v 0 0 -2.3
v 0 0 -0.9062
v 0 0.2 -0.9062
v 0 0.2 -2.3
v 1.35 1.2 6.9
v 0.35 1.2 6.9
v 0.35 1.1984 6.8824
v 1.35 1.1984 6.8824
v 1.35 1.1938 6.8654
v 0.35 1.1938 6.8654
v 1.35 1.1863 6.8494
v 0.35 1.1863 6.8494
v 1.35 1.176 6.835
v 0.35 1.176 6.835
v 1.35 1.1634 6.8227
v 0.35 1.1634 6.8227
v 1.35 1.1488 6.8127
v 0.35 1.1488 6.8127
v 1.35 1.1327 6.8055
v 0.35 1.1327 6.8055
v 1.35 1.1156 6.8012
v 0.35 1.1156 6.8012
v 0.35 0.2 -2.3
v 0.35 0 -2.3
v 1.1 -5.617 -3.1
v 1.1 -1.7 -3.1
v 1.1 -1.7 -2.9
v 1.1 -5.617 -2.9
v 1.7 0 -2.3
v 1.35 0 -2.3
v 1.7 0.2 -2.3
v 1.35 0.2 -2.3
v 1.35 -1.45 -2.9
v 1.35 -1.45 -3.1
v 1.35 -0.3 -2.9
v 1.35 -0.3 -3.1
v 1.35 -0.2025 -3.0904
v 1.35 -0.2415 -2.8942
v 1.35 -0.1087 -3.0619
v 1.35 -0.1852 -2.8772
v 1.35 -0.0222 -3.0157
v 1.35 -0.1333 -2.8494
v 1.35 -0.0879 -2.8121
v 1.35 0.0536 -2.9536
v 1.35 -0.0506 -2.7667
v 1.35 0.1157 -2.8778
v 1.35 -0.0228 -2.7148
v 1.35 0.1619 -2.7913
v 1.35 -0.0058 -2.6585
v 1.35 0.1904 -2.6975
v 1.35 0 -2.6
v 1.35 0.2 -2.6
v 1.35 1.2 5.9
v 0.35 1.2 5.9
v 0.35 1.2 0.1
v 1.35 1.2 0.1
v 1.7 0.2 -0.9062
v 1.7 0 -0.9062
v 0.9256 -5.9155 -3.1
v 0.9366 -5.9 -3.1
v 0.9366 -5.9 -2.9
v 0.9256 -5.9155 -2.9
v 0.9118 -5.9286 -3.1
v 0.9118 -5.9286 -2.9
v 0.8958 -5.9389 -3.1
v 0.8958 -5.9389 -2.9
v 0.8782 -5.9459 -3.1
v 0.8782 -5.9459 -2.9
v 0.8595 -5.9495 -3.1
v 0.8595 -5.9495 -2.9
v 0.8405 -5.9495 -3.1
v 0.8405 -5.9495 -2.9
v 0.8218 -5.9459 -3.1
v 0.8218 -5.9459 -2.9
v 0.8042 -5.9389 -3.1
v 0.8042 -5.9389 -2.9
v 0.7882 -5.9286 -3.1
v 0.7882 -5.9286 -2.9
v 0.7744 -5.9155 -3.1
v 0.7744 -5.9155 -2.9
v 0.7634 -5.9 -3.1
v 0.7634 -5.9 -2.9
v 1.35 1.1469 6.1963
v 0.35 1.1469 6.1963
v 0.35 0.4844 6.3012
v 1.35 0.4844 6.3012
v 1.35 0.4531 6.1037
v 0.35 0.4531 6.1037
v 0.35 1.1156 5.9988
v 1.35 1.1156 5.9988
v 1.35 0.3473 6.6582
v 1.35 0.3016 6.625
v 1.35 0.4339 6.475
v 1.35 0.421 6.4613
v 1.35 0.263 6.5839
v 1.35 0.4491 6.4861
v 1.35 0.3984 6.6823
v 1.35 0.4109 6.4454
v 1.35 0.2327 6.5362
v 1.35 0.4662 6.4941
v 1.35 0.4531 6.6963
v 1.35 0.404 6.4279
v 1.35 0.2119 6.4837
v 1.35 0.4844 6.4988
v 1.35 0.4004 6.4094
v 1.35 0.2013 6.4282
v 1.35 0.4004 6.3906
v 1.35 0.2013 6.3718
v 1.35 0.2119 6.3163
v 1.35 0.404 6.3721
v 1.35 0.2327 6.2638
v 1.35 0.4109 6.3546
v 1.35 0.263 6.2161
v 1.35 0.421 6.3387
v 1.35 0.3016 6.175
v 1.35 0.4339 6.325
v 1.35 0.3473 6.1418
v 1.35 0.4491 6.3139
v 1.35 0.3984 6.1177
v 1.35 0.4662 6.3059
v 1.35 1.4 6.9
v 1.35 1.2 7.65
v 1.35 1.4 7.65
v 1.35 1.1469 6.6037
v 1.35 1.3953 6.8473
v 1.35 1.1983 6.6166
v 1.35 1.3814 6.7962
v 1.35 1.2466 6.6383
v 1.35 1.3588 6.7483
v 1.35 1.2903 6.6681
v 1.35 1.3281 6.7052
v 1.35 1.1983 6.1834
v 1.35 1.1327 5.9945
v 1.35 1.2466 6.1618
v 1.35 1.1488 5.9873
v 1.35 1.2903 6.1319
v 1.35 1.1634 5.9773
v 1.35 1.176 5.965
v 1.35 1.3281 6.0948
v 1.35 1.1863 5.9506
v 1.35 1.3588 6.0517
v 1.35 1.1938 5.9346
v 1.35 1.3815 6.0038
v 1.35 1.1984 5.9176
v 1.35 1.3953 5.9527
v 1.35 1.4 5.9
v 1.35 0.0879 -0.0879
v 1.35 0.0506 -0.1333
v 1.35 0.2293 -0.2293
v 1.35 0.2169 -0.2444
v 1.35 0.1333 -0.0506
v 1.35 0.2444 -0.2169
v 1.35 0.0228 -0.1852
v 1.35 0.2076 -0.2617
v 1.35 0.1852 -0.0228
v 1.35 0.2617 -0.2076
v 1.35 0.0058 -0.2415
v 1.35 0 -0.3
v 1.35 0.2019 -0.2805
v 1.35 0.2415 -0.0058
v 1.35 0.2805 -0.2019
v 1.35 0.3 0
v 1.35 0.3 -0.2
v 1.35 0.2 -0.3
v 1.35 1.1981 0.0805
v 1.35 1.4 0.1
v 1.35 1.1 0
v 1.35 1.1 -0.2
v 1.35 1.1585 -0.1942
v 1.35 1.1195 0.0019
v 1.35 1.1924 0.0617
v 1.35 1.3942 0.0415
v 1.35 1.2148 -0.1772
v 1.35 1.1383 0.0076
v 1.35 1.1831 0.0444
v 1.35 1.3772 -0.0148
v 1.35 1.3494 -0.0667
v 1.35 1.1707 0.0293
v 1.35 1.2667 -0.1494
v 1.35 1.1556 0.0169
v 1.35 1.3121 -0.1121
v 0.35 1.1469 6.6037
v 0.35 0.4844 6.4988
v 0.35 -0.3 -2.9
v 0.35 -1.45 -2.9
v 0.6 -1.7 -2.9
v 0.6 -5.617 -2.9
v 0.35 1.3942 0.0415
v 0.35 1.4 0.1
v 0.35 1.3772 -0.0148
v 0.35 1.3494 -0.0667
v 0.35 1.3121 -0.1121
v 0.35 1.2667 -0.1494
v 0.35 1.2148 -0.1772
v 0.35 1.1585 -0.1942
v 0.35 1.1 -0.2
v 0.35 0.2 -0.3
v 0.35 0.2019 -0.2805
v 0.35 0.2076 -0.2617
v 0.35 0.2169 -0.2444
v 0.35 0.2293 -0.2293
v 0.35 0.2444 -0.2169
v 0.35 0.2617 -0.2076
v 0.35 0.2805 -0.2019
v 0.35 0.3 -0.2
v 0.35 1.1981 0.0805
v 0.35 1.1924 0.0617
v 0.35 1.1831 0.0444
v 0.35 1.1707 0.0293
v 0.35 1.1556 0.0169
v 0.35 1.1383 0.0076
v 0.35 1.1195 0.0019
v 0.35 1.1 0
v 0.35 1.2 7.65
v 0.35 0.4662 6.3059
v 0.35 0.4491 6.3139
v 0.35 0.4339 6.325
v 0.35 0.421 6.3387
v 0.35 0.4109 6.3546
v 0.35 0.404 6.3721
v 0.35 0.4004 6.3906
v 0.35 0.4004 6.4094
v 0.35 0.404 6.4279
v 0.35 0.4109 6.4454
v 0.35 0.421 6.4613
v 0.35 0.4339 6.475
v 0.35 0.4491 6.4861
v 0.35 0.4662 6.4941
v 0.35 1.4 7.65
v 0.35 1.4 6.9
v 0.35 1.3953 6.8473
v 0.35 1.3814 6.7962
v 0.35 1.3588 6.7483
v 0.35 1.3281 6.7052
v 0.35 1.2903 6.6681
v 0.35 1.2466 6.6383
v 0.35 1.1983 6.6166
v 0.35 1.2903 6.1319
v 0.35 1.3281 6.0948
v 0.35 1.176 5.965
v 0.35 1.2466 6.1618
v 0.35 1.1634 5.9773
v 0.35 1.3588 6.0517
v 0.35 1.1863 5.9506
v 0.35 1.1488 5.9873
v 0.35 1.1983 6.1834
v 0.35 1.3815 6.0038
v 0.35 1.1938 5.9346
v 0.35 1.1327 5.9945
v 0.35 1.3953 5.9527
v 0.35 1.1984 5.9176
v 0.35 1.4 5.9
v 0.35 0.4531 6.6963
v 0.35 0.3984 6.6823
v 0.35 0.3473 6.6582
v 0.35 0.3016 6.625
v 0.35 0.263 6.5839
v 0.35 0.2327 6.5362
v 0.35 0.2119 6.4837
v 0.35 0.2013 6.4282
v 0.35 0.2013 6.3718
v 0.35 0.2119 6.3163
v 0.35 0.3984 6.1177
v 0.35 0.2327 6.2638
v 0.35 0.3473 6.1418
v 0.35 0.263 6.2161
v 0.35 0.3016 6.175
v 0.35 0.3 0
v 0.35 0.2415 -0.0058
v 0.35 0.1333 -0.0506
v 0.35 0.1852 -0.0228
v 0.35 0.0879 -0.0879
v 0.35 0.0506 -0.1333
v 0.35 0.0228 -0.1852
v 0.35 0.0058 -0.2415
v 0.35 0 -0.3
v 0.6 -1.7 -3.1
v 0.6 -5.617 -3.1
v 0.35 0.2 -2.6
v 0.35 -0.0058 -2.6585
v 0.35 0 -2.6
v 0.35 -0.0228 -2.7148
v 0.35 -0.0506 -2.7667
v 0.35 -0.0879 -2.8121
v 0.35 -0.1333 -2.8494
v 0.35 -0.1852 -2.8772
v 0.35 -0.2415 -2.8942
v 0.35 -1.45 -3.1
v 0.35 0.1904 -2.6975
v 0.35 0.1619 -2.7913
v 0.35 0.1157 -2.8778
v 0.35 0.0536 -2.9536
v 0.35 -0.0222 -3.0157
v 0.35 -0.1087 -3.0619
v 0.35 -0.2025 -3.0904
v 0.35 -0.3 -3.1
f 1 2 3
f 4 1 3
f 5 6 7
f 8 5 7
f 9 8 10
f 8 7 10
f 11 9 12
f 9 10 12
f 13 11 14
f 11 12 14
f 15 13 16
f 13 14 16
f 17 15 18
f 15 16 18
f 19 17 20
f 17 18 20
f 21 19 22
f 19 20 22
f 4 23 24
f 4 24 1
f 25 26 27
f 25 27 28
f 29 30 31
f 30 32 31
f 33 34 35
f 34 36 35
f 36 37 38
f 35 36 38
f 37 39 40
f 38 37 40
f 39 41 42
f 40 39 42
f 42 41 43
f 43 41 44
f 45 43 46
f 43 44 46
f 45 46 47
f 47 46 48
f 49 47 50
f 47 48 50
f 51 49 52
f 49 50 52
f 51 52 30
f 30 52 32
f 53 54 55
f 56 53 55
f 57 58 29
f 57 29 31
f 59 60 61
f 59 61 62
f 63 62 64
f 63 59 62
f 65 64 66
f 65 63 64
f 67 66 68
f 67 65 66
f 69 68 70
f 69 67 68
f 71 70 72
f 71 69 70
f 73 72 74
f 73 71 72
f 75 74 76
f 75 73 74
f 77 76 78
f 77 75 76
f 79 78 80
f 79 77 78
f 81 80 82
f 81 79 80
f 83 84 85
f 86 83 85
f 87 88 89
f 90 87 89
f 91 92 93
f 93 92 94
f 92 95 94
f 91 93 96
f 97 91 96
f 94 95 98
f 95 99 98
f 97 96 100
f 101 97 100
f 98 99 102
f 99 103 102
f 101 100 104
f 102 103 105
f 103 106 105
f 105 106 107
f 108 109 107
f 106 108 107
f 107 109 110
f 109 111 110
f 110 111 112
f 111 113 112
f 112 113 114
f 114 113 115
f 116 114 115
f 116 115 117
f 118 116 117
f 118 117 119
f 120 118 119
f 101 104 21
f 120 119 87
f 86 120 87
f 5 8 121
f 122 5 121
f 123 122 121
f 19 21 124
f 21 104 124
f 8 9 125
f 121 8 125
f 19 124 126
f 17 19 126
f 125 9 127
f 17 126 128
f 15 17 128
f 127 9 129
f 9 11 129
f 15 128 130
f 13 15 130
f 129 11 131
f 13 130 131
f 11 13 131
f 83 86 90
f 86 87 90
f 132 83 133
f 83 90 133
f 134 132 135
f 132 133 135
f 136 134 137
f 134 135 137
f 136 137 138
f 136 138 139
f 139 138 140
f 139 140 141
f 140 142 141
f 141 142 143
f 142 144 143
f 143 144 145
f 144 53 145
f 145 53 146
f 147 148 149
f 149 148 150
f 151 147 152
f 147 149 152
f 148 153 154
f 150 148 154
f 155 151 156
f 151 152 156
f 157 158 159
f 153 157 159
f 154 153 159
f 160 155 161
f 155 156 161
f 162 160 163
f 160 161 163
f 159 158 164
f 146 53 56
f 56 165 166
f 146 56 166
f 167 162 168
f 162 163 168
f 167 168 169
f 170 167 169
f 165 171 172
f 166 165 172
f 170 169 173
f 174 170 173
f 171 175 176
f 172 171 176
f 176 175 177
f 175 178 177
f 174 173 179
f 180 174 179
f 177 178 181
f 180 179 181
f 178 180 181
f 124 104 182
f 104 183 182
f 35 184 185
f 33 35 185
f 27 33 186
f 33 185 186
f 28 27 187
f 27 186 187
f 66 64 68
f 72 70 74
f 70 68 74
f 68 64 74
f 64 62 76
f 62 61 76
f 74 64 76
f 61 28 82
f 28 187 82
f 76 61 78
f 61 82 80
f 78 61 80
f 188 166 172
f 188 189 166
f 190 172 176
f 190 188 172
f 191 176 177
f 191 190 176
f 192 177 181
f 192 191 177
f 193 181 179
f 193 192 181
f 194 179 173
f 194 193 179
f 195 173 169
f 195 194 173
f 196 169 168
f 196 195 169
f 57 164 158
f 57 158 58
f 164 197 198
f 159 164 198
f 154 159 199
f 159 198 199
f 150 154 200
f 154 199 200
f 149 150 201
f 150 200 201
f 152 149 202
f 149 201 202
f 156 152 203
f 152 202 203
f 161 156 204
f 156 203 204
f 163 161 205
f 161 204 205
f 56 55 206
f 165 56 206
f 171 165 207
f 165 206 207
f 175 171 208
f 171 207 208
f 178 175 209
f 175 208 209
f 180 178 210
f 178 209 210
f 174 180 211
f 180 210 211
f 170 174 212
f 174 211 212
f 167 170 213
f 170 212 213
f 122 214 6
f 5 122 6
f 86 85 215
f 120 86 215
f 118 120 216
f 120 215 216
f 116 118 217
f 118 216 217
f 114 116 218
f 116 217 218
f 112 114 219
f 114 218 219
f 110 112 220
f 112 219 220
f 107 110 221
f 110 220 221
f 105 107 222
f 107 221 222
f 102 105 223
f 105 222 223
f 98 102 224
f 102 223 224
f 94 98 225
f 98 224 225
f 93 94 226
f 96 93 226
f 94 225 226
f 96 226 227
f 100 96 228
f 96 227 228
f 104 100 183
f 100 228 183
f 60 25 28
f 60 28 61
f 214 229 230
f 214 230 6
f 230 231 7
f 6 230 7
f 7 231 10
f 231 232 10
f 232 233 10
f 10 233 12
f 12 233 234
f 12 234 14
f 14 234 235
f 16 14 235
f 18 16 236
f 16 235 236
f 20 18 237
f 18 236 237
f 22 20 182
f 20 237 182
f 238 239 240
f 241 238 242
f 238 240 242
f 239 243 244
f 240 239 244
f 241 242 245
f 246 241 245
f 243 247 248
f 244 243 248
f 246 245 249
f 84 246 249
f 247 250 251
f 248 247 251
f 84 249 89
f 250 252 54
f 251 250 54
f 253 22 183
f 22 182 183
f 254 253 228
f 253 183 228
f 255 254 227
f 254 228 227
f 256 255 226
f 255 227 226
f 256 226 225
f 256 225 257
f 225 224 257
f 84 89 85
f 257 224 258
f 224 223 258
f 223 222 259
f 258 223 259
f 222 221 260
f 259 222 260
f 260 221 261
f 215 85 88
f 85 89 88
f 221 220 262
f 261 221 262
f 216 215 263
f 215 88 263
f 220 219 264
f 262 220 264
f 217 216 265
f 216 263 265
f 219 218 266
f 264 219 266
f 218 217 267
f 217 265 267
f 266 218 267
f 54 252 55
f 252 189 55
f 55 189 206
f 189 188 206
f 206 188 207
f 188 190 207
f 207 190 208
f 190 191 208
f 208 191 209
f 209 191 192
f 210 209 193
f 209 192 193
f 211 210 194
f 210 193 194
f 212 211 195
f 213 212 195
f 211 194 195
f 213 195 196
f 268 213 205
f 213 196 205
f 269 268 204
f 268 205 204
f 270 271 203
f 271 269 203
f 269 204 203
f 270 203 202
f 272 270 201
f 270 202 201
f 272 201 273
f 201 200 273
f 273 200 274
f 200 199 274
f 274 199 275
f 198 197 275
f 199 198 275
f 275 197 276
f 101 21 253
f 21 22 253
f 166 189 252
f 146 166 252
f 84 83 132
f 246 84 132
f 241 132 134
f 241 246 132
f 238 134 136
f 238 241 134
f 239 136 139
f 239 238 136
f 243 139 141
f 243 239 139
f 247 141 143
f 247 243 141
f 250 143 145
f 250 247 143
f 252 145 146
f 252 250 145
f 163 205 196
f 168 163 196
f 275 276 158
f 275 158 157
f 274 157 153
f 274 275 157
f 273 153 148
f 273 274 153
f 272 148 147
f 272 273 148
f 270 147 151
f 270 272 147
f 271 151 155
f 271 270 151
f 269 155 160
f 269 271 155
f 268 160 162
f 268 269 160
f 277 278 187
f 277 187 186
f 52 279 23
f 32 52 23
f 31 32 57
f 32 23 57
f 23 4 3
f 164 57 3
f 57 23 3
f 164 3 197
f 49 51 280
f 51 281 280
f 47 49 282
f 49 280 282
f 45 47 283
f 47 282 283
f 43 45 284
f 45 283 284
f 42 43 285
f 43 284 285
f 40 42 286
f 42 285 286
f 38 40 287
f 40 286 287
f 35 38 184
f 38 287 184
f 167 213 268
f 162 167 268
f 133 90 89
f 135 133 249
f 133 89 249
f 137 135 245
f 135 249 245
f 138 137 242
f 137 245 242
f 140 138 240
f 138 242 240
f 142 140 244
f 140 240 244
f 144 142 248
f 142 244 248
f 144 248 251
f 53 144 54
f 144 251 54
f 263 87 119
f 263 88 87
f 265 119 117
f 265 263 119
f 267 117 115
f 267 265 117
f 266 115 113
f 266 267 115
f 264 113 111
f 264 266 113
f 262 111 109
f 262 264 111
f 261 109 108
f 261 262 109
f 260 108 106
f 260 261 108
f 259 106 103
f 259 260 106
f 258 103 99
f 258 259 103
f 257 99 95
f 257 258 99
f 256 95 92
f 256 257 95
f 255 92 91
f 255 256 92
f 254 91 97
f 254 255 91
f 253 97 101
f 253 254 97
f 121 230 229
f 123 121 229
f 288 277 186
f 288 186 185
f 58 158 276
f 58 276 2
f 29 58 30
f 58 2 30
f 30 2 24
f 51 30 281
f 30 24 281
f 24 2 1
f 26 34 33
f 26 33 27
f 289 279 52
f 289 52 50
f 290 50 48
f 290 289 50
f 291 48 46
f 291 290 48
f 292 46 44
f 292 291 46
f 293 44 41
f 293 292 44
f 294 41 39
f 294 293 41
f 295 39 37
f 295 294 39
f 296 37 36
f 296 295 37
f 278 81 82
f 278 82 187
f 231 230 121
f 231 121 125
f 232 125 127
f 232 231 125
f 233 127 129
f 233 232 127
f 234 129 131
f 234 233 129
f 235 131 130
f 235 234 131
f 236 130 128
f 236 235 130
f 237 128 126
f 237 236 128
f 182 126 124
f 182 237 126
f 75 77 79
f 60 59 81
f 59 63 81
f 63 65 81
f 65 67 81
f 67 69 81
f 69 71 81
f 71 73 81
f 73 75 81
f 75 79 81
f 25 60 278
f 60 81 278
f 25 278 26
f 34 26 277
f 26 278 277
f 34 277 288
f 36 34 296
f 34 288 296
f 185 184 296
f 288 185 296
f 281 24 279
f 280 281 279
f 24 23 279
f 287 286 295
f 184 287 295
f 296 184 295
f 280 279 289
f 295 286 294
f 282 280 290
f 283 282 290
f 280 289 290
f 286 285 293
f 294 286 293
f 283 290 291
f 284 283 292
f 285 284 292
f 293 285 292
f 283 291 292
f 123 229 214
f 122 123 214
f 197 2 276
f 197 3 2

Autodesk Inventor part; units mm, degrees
ref_plane "YZ Plane" through (0, 0, 0) normal (1, 0, 0) x (0, 1, 0)
ref_plane "XZ Plane" through (0, 0, 0) normal (0, 1, 0) x (-1, 0, 0)
sketch "Sketch1" plane through (0, 0, 0) normal (1, 0, 0) x (0, 1, 0)
  line L0 (1.1156, 6.8012) -> (0.4531, 6.6963)
  line L1 (0.4531, 6.1037) -> (1.1156, 5.9988)
  line L2 (1.2, 5.9) -> (1.2, 0.1)
  line L3 (1.1, 0) -> (0.3, 0)
  line L4 (0, -0.3) -> (0, -2.6)
  line L5 (-0.3, -2.9) -> (-5.95, -2.9)
  line L6 (-5.95, -2.9) -> (-5.95, -3.1)
  line L7 (-5.95, -3.1) -> (-0.3, -3.1)
  line L8 (0.2, -2.6) -> (0.2, -0.3)
  line L9 (0.3, -0.2) -> (1.1, -0.2)
  line L10 (1.4, 0.1) -> (1.4, 5.9)
  line L11 (1.1469, 6.1963) -> (0.4844, 6.3012)
  line L12 (0.4844, 6.4988) -> (1.1469, 6.6037)
  line L13 (1.4, 6.9) -> (1.4, 7.65)
  line L14 (1.4, 7.65) -> (1.2, 7.65)
  line L15 (1.2, 7.65) -> (1.2, 6.9)
  line L16 (0, -5.3743) -> (0, 9.8207) projected
  line L17 (-7.4324, 0) -> (2.9446, 0) projected
  arc A0 (0.3, -0.2) -> (0.2, -0.3) centre (0.3, -0.3) ccw
  arc A1 (-0.3, -2.9) -> (0, -2.6) centre (-0.3, -2.6) ccw
  arc A2 (1.1, 0) -> (1.2, 0.1) centre (1.1, 0.1) ccw
  arc A3 (1.2, 5.9) -> (1.1156, 5.9988) centre (1.1, 5.9) ccw
  arc A4 (0.4844, 6.4988) -> (0.4844, 6.3012) centre (0.5, 6.4) ccw
  arc A5 (1.1156, 6.8012) -> (1.2, 6.9) centre (1.1, 6.9) ccw
  arc A6 (0.4531, 6.6963) -> (0.4531, 6.1037) centre (0.5, 6.4) ccw
  arc A7 (1.4, 5.9) -> (1.1469, 6.1963) centre (1.1, 5.9) ccw
  arc A8 (1.1469, 6.6037) -> (1.4, 6.9) centre (1.1, 6.9) ccw
  arc A9 (1.1, -0.2) -> (1.4, 0.1) centre (1.1, 0.1) ccw
  arc A10 (0.3, 0) -> (0, -0.3) centre (0.3, -0.3) ccw
  arc A11 (-0.3, -3.1) -> (0.2, -2.6) centre (-0.3, -2.6) ccw
  point P0 (1.2, 6.8146)
  point P1 (0, -2.9)
  point P2 (1.4, 6.1562)
  point P3 (-0.1393, 6.4)
  point P4 (1.4, 6.6438)
  dimension "d0" = 0.2
  dimension "d1" = 0.2
  dimension "d3" = 0.2
  dimension "d8" = 0.2
  dimension "d9" = 0.2
  dimension "d10" = 0.2
  dimension "d12" = 5.95
  dimension "d16" = 1.2
  dimension "d20" = 0.2438
  dimension "d21" = 0.2438
  dimension "d23" = 0.1
  dimension "d25" = 1
  dimension "d26" = 9.8
  dimension "d27" = 0.75
  dimension "d28" = 2.6
  dimension "d31" = 9.3
  dimension "d70" = 0.3
extrude "Extrusion1" add sketch "Sketch1" along normal blind 1.7 contours A5 L15 L14 L13 A8 L12 A4 L11 A7 L10 A9 L17 A2 L2 A3 L1 A6 L0 | L17 A9 L9 A0 L8 A11 L16 L4 A10 L3 | L16 A11 L7 L6 L5 A1
ref_plane "Work Plane1" through (0, 0.2, -0.3) normal (0, 0, 1) x (1, 0, 0)
sketch "Sketch2" plane through (0, 0.3, -0.3) normal (0, 0, -1) x (-1, 0, 0)
  line L0 (0, 1.1) -> (-1.7, 1.1) projected
  line L1 (0, -0.3) -> (-1.7, -0.3) projected
  line L2 (-1.35, 1.1) -> (-0.35, 1.1)
  line L3 (-0.35, 1.1) -> (-0.35, -0.3)
  line L4 (-0.35, -0.3) -> (-1.35, -0.3)
  line L5 (-1.35, -0.3) -> (-1.35, 1.1)
  line L6 (-1.7, 0) -> (-1.7, 0.8) projected
  line L7 (0, 0) -> (0, 0.8) projected
  line L8 (-1.7, 0) -> (-1.7, -0.3) projected
  line L9 (-1.35, 1.1) -> (-1.7, 1.1)
  line L10 (-1.7, 1.1) -> (-1.7, -0.3)
  line L11 (-1.7, -0.3) -> (-1.35, -0.3)
  line L12 (-1.35, -0.3) -> (-1.35, 1.1)
  line L13 (0, 0) -> (0, -0.3) projected
  line L14 (-0.35, 1.1) -> (0, 1.1)
  line L15 (0, 1.1) -> (0, -0.3)
  line L16 (0, -0.3) -> (-0.35, -0.3)
  line L17 (-0.35, -0.3) -> (-0.35, 1.1)
  dimension "d32" = 1
  dimension "d33" = 0.35
  dimension "d34" = 0.35
extrude "Extrusion2" cut sketch "Sketch2" against normal up to surface (7.95 mm away) contours L15 L7 L13 L1 L3 L0 | L5 L1 L8 L6 L10 L0
sketch "Sketch3" plane through (0, 0.2, -2.6) normal (0, 1, 0) x (1, 0, 0)
  line L0 (0.35, -2.3) -> (1.35, -2.3) projected
  line L1 (1.35, -2.3) -> (1.7, -1.6938)
  line L2 (1.7, 0) -> (1.7, -2.3) projected
  line L3 (1.35, -2.3) -> (2.05, -2.3) construction
  line L4 (1.7, -1.6938) -> (1.7, -2.3)
  line L5 (1.35, -2.3) -> (1.7, -2.3) projected
  line L6 (1.7, -2.3) -> (1.35, -2.3)
  line L7 (1.35, -2.3) -> (0.35, -2.3)
  line L8 (0, -2.3) -> (0, 0) projected
  line L9 (0.35, -2.3) -> (0, -2.3)
  line L10 (0, -2.3) -> (0, -1.6938)
  line L11 (0, -1.6938) -> (0.35, -2.3)
  line L12 (0.35, -0.3) -> (0.35, 0.3)
  line L13 (1.35, -0.3) -> (1.7, -0.3)
  line L14 (1.7, -0.3) -> (1.7, 0.5)
  line L15 (1.7, 0.5) -> (1.35, 0.5)
  line L16 (1.35, 0.5) -> (1.35, -0.3)
  line L17 (0.35, -0.3) -> (0, -0.3)
  line L18 (0, -0.3) -> (0, 0.5)
  line L19 (0, 0.5) -> (0.35, 0.5)
  line L20 (0.35, 0.5) -> (0.35, -0.3)
  line L21 (0, 0) -> (1.7, 0) projected
  point P0 (0, -2.6)
  point P1 (0, -1.6938)
  point P2 (0.35, 0.3)
  point P3 (0.35, 0.3)
  dimension "d38" = 60
  dimension "d39" = 60
  dimension "d59" = 2
  dimension "d60" = 2
  dimension "d62" = 1
  dimension "d63" = 0.35
  dimension "d64" = 0.35
extrude "Extrusion3" cut sketch "Sketch3" against normal up to surface (6.15 mm away) contours L9 L8 L11 | L1 L2 L5 | L8 L21 L12 L17 | L13 L16 L21 L2 | L18 L19 L20 L12 L21 | L21 L16 L15 L14
sketch "Sketch5" plane through (1.35, -0.3, -3.1) normal (0, 0, -1) x (-1, 0, 0)
  line L0 (0, -1.15) -> (0.25, -1.4)
  line L1 (0.25, -1.4) -> (0.25, -5.317)
  line L2 (0.25, -5.317) -> (0.4134, -5.6)
  line L3 (0.5866, -5.6) -> (0.75, -5.317)
  line L4 (0.75, -5.317) -> (0.75, -1.4)
  line L5 (0.75, -1.4) -> (1, -1.15)
  line L6 (0.25, -5.317) -> (0.75, -5.317) construction
  line L7 (0, -1.15) -> (1, -1.15) construction
  arc A0 (0.4134, -5.6) -> (0.5866, -5.6) centre (0.5, -5.55) ccw
  line L8 (0, 0.3) -> (-0.35, 0.3) projected
  line L9 (1.35, 0.3) -> (1, 0.3) projected
  line L10 (0, 0) -> (0, -5.65) projected
  line L11 (1, -5.65) -> (1, 0) projected
  line L12 (1, -5.65) -> (0, -5.65) projected
  point P0 (0.5, -5.65)
  point P1 (1.35, -5.85)
  point P2 (-0.35, -5.85)
  point P3 (0, 0.6)
  point P4 (1, 0.6)
  point P5 (0.5, -5.35)
  dimension "d45" = 60
  dimension "d46" = 0.5
  dimension "d48" = 135
  dimension "d49" = 135
  dimension "d53" = 0.1
  dimension "d65" = 1.7
  dimension "d66" = 1.7
  dimension "d67" = 0.25
  dimension "d68" = 0.5
  dimension "d69" = 0.25
extrude "Extrusion4" cut sketch "Sketch5" against normal up to surface (0.2 mm away)
equation "\"d20\" = d21"
equation "\"d33\" = d34"
equation "\"d63\" = d64"
equation "\"BendRadius\" = Thickness"
equation "\"BendReliefWidth\" = Thickness"
equation "\"BendReliefDepth\" = 0.5 * Thickness"
equation "\"CornerReliefSize\" = 4 * Thickness"
equation "\"MinimumRemnant\" = 2 * Thickness"
equation "\"TransitionRadius\" = BendRadius"
equation "\"JacobiRadiusSize\" = BendRadius"
equation "\"GapSize\" = Thickness"
equation "\"Thickness\" = 0.2"
properties part number "USB 3.0 A Recepticle Lower Pin" material "Nickel-Copper Alloy 400"
